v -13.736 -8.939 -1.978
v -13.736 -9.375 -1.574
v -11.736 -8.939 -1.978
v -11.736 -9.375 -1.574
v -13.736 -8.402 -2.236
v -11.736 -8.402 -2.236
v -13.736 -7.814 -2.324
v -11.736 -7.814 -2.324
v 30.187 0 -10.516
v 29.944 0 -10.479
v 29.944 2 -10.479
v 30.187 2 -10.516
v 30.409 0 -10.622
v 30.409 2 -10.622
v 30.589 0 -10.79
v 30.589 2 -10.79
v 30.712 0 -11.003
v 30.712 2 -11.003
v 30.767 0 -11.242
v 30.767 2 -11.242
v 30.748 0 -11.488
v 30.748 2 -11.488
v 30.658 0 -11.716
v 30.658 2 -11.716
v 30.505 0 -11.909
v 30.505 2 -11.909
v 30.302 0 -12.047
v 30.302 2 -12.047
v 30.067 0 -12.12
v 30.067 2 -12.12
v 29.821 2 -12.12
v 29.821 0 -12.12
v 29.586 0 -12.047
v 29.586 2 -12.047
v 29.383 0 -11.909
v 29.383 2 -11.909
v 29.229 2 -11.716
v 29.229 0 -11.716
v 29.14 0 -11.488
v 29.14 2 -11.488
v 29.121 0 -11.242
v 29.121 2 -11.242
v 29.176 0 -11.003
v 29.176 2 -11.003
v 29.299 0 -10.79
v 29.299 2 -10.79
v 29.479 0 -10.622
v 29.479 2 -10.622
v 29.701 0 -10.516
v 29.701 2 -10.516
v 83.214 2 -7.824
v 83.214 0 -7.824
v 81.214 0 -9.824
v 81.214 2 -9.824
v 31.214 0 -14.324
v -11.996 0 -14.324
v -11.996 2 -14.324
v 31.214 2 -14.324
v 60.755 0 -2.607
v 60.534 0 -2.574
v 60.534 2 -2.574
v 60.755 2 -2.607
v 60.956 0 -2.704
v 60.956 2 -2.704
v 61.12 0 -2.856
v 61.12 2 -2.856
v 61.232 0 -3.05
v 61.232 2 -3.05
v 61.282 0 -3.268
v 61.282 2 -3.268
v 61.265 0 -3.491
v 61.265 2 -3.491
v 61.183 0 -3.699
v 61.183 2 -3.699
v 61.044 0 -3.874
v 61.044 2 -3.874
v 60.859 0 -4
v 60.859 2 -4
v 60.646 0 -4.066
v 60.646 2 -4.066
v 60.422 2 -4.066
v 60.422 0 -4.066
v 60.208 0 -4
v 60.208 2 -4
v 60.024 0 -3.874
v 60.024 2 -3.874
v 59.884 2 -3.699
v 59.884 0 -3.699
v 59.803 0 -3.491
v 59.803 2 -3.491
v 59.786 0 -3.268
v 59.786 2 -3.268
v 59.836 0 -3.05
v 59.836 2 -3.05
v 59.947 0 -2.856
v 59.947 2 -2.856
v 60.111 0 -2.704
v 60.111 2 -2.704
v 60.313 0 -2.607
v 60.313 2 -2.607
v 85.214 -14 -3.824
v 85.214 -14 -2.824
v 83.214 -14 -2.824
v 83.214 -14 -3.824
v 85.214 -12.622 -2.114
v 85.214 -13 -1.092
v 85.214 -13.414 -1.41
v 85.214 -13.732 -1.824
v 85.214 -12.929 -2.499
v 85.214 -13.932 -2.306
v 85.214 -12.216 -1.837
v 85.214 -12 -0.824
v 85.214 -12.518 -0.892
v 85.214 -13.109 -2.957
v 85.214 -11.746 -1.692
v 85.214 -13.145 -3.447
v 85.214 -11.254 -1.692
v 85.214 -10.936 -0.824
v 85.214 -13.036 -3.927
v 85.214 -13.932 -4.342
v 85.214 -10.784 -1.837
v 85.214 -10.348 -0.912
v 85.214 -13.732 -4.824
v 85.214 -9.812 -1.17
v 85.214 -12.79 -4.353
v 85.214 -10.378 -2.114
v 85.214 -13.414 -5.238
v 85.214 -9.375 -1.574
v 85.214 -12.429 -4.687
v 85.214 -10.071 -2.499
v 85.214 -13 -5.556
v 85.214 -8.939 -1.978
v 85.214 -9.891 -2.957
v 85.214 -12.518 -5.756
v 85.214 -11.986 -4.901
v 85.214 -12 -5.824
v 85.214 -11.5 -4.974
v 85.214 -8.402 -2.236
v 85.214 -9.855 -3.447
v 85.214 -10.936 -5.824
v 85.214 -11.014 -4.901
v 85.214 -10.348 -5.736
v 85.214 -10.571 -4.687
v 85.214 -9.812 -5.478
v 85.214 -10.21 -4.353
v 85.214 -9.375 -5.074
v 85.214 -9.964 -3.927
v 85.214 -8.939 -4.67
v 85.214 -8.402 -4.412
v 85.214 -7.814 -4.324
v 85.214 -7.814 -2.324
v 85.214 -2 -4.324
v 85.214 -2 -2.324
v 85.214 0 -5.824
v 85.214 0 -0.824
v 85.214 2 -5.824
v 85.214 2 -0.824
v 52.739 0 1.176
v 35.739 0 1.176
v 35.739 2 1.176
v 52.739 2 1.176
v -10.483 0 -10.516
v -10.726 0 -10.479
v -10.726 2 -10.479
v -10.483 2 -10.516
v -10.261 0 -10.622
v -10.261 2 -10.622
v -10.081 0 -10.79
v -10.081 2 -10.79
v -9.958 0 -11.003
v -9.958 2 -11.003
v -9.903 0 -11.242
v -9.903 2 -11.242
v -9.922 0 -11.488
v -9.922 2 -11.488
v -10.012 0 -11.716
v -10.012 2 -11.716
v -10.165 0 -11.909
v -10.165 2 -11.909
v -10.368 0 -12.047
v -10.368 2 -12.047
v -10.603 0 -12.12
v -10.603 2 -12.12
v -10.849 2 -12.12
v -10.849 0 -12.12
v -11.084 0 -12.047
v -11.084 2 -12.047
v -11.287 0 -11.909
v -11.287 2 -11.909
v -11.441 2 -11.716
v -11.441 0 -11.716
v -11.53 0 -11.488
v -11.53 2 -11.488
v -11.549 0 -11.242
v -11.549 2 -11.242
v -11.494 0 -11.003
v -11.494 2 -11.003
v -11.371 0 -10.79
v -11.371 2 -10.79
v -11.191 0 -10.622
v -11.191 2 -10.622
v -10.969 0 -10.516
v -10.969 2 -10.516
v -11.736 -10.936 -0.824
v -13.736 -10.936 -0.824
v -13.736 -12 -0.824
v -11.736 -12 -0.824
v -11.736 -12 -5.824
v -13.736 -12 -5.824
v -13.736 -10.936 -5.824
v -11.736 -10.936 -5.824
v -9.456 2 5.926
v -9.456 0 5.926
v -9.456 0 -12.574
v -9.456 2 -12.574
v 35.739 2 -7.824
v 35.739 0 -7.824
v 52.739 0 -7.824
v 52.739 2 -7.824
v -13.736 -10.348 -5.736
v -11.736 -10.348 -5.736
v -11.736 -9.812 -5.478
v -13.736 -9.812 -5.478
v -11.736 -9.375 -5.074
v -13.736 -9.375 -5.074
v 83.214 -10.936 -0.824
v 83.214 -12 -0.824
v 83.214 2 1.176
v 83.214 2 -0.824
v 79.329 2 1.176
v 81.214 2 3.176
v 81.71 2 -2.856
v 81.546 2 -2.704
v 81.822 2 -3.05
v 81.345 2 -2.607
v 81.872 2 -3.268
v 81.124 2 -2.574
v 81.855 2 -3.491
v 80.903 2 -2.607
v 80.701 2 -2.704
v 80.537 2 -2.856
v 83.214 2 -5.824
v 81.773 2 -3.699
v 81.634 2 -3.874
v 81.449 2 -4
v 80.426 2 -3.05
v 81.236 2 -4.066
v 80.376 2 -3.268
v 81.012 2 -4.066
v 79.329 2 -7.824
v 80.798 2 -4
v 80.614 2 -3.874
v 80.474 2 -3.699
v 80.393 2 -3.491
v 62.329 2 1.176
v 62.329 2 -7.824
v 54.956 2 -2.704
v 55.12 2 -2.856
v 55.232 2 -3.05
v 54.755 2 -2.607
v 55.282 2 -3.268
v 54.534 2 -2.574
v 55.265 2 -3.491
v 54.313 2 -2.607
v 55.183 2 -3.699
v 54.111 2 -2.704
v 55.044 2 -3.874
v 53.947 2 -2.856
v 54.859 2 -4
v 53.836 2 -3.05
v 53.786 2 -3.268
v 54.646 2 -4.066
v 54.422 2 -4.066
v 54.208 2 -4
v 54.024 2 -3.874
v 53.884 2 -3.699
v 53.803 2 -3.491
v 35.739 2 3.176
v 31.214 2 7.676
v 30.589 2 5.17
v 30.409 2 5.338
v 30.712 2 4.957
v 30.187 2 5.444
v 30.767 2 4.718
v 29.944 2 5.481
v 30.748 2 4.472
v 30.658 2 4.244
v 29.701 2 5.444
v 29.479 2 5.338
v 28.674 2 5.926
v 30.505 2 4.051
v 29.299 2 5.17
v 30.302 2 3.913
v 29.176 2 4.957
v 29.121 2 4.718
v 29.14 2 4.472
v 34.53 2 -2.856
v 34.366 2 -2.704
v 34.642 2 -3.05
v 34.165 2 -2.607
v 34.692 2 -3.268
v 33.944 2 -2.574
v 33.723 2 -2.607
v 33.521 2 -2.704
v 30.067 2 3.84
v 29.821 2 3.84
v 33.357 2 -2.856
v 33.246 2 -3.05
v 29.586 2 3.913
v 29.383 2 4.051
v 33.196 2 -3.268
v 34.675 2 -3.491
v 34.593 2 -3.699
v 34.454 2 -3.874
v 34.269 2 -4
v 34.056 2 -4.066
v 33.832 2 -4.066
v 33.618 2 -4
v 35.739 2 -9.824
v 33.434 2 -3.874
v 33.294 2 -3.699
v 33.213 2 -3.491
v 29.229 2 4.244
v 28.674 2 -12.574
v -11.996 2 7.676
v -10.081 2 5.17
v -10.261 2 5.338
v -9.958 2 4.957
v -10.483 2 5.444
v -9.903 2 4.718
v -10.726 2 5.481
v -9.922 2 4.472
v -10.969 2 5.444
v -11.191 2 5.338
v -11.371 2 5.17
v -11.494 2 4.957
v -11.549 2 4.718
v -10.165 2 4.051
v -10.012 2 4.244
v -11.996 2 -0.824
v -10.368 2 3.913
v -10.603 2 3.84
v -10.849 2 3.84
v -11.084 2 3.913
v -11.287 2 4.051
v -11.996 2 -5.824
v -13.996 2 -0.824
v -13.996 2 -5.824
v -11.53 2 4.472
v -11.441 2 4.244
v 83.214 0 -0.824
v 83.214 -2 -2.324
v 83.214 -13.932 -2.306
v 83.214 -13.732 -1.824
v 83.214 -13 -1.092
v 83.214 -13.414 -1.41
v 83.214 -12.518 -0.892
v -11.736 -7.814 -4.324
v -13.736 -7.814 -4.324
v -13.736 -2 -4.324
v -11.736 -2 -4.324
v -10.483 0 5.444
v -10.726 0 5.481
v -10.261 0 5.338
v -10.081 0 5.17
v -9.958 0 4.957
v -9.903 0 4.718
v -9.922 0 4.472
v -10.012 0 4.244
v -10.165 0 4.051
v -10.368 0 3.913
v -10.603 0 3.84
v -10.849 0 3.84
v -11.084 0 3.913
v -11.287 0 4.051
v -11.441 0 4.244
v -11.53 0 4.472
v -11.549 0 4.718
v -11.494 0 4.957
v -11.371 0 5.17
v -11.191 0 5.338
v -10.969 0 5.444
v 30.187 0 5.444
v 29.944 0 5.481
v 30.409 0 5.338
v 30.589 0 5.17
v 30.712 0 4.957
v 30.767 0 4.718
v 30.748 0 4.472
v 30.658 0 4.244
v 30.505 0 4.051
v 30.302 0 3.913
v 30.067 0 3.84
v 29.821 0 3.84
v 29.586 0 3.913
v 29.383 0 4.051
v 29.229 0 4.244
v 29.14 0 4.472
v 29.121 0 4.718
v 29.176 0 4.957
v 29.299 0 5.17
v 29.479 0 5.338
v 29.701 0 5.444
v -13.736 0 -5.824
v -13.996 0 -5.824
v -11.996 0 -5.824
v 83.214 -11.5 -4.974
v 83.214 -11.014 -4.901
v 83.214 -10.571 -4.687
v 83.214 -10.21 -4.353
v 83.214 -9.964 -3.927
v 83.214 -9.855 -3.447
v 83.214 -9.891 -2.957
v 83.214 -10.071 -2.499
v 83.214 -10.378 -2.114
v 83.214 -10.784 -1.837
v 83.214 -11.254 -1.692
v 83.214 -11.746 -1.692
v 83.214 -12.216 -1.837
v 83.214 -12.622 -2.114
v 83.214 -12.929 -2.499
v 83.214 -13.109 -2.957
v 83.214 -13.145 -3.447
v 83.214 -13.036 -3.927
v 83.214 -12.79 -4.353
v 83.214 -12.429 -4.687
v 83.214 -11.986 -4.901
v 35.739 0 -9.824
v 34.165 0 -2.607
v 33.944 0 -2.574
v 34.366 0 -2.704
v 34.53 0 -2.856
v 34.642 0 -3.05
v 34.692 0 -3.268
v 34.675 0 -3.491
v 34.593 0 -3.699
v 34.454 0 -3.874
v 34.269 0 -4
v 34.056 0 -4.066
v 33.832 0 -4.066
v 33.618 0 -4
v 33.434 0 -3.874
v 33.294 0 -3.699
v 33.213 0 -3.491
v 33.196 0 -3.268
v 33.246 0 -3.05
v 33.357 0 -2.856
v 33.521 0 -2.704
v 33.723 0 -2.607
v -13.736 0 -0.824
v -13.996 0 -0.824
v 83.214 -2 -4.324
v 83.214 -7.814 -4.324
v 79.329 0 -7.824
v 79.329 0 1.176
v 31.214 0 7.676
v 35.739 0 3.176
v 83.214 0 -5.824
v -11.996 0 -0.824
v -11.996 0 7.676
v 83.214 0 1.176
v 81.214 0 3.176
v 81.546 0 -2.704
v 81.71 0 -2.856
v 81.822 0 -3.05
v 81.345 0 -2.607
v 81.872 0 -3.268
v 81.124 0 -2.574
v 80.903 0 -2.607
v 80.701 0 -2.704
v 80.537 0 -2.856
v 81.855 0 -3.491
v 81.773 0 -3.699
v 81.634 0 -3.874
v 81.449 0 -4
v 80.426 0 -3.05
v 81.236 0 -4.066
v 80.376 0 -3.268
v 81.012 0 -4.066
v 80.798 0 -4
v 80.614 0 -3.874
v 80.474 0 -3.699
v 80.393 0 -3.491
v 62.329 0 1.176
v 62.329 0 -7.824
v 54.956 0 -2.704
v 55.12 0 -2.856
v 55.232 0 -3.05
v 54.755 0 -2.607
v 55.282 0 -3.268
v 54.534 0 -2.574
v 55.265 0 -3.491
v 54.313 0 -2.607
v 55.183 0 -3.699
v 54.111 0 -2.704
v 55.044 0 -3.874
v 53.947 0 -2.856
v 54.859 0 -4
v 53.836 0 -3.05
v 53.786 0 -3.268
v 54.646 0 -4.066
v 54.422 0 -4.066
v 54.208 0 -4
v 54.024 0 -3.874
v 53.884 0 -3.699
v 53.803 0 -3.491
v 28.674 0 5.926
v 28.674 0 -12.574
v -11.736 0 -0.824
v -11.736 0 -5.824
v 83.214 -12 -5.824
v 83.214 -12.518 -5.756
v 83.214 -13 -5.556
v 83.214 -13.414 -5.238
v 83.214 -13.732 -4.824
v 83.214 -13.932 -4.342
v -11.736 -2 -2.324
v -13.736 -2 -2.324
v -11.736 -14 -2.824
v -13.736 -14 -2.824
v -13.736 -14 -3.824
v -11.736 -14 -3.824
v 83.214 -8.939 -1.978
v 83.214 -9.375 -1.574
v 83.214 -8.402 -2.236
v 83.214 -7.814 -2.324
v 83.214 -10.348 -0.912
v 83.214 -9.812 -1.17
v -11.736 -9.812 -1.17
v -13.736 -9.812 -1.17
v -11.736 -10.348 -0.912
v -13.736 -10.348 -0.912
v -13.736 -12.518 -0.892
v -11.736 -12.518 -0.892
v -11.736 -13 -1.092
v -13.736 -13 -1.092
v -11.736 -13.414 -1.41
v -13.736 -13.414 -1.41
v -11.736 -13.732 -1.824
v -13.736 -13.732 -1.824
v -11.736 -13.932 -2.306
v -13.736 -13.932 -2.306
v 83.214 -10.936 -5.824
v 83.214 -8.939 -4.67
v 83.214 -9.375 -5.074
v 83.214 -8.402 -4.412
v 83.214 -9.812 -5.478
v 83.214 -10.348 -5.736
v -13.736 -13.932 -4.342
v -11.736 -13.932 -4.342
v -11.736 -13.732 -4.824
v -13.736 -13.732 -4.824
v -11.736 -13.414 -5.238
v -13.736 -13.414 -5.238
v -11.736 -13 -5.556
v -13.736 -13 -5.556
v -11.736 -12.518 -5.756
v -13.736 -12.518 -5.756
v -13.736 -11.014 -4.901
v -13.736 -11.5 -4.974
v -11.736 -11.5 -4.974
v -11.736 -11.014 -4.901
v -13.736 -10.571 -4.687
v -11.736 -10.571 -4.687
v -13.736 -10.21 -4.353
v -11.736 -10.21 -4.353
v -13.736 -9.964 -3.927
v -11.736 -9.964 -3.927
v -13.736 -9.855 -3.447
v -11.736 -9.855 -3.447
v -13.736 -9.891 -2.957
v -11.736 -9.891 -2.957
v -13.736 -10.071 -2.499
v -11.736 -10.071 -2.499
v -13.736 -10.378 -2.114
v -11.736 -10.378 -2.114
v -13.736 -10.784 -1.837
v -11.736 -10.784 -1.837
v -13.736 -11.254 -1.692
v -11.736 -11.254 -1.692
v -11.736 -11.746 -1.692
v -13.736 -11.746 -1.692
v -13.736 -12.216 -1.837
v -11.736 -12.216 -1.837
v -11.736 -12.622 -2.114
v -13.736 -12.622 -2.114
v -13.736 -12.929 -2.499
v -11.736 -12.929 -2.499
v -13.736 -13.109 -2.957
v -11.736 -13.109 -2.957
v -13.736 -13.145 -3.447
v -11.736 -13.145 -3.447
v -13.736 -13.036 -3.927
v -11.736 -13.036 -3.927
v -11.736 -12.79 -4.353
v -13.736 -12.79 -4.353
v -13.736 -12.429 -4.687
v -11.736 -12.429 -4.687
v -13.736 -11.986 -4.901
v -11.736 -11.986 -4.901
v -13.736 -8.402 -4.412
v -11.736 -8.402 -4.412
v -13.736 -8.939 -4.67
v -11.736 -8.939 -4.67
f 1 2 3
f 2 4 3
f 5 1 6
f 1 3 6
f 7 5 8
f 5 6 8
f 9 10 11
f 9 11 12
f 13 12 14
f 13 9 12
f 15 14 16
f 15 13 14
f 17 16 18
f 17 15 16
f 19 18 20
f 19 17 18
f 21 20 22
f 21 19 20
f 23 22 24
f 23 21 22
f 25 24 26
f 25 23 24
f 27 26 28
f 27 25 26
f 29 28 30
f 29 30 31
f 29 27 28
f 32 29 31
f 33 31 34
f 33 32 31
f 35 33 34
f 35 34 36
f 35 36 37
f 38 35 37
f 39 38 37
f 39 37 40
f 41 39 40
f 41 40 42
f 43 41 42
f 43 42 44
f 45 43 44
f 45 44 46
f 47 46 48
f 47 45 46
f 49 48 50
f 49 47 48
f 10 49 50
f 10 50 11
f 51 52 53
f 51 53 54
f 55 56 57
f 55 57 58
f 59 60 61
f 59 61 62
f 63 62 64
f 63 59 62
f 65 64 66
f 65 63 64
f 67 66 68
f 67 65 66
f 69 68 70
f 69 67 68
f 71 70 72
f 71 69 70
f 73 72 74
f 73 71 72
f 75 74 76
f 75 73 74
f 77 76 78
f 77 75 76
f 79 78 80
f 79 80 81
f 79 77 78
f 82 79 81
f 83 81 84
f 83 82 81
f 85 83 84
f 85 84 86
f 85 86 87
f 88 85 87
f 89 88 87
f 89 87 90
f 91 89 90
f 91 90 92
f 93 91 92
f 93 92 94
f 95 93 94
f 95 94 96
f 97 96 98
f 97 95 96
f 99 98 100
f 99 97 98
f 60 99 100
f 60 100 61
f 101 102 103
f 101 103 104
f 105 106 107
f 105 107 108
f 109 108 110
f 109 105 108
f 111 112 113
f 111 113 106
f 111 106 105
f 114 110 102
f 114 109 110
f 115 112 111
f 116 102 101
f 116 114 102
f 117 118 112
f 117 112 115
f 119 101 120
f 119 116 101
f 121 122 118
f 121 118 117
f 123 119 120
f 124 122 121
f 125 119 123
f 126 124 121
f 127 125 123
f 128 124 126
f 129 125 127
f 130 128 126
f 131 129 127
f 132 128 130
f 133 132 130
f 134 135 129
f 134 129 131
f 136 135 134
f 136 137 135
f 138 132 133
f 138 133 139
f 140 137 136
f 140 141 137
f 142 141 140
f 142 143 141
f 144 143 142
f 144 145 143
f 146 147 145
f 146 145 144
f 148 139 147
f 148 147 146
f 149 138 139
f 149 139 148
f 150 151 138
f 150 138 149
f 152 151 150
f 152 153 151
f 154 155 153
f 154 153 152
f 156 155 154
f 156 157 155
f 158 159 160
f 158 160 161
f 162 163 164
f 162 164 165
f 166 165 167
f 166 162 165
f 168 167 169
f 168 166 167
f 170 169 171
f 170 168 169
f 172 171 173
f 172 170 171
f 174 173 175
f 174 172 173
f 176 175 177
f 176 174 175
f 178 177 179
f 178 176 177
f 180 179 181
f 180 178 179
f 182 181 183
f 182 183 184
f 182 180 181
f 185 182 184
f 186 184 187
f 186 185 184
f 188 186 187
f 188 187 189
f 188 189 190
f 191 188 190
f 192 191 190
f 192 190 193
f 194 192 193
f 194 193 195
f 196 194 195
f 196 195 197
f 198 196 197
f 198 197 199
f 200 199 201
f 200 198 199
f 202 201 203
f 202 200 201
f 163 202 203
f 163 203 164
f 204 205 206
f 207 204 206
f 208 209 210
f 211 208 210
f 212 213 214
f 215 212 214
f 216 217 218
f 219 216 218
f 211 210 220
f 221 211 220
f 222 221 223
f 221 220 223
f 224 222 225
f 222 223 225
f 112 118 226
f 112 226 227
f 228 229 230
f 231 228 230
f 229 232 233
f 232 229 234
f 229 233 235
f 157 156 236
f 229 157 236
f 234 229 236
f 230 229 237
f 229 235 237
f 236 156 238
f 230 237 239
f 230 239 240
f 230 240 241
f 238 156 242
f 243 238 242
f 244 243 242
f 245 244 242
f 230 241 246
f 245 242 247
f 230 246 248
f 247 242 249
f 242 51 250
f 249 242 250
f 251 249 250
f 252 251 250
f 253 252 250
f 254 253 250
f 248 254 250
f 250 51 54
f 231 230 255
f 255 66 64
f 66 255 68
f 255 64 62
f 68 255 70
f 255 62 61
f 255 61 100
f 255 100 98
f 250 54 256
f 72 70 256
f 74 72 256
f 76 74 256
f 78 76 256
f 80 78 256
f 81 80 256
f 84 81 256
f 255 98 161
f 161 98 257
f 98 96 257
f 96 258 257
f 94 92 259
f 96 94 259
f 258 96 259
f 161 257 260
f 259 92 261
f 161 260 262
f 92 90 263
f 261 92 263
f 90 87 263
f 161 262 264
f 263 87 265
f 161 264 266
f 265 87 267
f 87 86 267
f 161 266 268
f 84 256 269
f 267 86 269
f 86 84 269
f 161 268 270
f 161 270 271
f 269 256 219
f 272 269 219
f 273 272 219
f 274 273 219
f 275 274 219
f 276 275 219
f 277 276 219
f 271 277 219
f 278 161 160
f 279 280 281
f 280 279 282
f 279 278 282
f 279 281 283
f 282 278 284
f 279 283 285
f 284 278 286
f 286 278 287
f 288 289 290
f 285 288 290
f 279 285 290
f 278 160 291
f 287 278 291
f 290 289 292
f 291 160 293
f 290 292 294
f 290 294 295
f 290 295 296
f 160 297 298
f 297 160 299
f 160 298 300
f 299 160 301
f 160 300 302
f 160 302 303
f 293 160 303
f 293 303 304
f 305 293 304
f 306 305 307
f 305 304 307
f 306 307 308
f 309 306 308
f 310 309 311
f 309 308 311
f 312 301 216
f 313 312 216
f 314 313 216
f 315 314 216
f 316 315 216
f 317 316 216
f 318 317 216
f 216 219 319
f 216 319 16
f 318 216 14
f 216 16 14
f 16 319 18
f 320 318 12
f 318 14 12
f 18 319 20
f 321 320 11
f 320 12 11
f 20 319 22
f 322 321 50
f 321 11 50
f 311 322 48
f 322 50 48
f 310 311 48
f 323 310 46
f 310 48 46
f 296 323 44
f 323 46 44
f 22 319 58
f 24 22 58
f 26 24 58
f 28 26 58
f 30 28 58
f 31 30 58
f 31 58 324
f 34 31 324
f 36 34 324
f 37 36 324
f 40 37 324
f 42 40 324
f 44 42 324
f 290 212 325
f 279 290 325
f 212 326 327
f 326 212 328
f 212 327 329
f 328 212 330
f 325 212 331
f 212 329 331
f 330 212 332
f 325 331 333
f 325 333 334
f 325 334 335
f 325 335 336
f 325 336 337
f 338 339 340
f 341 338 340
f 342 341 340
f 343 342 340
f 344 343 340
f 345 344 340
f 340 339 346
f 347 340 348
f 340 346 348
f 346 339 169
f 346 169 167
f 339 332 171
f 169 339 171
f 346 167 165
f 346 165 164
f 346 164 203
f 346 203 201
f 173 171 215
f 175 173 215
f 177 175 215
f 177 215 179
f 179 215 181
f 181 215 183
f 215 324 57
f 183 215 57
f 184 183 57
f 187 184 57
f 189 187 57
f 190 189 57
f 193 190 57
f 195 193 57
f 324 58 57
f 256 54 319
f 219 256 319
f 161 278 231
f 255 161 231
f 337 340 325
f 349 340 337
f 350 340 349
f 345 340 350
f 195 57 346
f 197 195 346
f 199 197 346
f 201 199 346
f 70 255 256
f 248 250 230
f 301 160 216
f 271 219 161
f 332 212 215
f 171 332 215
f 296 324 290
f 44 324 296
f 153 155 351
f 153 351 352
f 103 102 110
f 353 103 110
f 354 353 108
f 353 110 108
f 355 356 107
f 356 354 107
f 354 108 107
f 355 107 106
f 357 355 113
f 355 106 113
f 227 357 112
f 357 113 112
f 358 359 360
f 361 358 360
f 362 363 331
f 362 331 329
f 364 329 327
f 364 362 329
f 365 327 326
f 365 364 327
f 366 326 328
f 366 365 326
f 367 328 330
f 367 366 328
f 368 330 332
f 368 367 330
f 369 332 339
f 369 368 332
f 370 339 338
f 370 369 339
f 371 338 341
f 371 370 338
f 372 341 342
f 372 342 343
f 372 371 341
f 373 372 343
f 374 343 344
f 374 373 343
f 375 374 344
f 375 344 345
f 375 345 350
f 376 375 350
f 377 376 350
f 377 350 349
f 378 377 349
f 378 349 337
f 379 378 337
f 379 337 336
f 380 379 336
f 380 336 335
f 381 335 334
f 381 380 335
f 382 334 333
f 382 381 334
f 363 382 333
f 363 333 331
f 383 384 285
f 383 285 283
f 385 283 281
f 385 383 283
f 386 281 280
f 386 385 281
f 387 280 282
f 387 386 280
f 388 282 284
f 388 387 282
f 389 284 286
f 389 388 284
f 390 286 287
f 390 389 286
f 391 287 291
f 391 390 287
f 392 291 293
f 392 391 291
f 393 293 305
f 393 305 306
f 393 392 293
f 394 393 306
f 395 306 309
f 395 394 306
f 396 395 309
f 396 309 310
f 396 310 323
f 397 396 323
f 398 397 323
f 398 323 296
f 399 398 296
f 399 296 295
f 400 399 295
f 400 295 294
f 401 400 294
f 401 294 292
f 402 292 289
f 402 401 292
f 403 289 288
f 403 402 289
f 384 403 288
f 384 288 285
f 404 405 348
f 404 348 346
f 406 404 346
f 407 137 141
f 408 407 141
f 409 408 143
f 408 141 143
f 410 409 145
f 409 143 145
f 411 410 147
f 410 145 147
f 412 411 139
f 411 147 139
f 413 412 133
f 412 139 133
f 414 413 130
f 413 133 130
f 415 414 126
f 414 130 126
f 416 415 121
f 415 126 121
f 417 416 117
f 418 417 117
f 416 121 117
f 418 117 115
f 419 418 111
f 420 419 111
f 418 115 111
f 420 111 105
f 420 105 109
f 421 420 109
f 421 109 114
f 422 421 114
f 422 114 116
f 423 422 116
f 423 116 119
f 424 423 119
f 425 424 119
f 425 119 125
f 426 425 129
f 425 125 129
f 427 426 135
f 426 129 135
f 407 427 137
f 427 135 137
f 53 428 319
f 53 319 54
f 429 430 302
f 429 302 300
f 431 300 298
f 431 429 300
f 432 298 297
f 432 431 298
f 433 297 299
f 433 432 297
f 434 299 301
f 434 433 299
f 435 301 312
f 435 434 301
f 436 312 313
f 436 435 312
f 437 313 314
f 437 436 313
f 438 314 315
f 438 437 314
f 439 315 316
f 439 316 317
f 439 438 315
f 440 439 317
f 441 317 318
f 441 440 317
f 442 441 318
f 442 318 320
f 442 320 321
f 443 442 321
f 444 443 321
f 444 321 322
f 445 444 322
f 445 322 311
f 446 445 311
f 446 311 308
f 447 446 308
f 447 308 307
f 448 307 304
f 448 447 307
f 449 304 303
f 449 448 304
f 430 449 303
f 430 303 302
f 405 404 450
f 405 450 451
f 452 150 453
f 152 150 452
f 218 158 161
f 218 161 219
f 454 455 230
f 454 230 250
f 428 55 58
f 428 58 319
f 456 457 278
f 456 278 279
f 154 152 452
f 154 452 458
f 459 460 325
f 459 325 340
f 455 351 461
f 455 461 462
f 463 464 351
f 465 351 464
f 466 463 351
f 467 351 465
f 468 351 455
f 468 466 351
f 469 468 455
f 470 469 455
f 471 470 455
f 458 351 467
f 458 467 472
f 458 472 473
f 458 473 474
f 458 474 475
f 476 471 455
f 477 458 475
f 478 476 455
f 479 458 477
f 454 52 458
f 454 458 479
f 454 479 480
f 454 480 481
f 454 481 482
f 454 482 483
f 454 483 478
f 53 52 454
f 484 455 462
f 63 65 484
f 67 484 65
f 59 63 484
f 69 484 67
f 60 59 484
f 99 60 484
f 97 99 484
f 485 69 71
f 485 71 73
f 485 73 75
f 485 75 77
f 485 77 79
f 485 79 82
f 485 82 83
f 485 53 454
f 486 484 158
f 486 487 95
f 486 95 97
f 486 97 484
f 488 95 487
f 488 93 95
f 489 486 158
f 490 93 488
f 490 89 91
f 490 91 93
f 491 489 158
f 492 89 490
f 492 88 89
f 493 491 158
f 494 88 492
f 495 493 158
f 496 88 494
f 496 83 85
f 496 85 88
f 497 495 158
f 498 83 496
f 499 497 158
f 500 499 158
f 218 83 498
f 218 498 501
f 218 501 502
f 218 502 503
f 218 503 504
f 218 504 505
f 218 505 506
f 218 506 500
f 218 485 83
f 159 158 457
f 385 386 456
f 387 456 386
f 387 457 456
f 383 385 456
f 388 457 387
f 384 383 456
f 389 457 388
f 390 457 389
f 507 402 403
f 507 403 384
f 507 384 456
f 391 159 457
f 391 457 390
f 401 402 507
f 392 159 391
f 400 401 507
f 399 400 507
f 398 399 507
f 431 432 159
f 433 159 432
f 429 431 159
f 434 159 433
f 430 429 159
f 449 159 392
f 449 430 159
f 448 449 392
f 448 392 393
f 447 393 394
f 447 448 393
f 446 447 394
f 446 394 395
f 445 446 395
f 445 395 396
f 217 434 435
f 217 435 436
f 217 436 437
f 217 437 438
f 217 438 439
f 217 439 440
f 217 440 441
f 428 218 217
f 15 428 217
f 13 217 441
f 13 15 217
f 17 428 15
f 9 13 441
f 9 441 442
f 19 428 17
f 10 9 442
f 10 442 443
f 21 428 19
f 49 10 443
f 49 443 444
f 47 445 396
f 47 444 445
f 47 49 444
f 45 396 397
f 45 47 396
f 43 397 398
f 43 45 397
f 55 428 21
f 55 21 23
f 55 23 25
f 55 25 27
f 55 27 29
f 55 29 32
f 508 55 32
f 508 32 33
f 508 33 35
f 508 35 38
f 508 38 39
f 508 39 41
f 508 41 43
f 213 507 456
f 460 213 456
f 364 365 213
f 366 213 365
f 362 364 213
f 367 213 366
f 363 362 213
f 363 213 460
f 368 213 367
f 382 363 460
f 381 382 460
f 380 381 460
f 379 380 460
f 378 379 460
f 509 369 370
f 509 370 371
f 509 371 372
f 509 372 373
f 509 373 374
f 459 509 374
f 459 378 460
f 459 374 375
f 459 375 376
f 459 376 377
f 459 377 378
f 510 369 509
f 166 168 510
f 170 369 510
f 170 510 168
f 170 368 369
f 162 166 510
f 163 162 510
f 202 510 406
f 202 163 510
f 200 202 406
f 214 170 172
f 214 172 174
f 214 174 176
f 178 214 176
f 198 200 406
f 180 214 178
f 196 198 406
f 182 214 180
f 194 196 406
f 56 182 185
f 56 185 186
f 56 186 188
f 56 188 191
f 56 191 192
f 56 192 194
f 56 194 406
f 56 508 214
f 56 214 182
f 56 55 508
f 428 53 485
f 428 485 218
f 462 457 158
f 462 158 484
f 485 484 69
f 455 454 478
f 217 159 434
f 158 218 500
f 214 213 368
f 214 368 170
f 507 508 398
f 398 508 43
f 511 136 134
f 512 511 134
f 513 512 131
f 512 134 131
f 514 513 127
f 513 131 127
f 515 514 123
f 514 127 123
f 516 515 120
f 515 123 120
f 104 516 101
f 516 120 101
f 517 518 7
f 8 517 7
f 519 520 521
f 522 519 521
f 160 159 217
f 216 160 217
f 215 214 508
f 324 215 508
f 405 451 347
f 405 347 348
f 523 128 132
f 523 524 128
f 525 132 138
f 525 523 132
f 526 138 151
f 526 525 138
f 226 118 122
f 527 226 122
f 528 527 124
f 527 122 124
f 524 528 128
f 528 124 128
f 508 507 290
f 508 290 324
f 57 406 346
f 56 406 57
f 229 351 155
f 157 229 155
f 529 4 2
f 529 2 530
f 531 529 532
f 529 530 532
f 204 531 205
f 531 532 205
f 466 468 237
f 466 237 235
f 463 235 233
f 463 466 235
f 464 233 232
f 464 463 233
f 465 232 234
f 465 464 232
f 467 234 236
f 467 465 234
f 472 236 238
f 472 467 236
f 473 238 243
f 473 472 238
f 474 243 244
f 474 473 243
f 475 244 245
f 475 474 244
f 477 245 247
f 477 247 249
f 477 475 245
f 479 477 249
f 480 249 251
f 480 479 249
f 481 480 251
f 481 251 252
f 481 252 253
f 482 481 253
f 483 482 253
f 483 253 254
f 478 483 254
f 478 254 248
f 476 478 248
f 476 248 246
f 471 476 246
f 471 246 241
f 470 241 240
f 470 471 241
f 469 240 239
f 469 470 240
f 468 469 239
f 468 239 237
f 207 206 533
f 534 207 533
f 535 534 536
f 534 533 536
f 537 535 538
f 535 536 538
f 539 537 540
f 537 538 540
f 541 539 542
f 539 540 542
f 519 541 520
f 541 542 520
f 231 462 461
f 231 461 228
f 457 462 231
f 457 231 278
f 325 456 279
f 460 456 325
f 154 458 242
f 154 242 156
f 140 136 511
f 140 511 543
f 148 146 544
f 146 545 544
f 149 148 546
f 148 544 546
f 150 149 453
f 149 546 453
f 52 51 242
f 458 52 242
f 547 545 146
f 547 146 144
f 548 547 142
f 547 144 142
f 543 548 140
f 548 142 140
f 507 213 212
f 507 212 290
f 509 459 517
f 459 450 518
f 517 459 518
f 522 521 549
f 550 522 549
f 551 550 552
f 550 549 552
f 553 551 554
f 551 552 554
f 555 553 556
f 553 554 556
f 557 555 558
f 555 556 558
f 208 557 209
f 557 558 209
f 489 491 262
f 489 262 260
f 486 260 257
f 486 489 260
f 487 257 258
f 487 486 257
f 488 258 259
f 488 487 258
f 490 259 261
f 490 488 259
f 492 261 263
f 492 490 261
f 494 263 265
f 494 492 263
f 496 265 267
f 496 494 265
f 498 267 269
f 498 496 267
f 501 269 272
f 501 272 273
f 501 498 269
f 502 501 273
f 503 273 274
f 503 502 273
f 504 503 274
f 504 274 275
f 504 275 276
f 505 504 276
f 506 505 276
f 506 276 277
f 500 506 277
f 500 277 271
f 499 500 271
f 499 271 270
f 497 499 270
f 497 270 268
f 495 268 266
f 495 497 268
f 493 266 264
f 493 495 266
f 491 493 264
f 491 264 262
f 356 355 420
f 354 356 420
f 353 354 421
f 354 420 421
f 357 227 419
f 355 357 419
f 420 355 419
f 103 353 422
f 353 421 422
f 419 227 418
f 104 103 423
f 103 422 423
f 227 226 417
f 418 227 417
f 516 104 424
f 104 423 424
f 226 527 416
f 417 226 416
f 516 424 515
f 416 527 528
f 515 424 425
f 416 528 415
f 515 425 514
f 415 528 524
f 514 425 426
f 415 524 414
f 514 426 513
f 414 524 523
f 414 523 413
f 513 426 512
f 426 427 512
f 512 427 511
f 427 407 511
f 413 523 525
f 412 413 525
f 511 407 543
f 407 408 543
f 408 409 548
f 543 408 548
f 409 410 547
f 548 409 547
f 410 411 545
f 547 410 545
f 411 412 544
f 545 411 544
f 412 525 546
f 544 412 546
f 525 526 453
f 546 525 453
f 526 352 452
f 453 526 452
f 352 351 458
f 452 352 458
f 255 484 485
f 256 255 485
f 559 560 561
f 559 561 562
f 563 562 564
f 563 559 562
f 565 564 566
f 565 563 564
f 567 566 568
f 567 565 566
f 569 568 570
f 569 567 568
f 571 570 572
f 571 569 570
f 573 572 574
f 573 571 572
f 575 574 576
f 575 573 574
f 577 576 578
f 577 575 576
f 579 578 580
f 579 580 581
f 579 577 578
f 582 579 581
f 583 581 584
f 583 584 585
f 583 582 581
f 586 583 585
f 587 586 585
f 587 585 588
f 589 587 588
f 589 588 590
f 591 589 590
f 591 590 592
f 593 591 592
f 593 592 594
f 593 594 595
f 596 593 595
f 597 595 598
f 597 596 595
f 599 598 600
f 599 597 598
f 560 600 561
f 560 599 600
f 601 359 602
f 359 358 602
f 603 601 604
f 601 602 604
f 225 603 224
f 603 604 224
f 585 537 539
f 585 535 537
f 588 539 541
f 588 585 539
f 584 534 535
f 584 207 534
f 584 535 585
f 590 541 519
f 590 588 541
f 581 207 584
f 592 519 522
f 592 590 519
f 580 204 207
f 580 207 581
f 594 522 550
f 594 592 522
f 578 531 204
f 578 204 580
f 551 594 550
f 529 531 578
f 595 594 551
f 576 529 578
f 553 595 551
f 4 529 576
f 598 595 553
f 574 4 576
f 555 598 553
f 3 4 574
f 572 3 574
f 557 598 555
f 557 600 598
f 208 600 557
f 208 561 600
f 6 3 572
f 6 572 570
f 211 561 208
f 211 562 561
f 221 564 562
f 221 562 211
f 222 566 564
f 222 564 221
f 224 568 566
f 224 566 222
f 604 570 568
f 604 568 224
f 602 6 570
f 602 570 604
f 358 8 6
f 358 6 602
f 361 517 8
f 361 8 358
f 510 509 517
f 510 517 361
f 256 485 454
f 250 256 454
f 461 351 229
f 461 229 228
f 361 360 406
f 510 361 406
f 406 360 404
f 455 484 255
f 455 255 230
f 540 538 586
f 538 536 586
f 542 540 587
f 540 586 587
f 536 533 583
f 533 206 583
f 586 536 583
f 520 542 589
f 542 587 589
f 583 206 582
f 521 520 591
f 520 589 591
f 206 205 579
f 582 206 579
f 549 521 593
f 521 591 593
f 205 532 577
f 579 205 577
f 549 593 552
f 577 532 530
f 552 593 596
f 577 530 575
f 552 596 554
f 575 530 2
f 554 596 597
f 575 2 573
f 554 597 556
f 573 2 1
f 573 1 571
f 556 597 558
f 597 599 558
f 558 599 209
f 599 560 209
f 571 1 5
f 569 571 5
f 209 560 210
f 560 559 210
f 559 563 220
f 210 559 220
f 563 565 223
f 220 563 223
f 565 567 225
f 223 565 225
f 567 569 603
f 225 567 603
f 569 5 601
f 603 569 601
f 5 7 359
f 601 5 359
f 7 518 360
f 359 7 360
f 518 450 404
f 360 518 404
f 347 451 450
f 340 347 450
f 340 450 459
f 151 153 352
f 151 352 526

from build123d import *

# Parameters (mm, degrees)
ESQUISSE1_R        = 0.825
ESQUISSE1_R_2      = 0.75
ESQUISSE1_W        = 38.13
ESQUISSE1_H        = 18.5
ESQUISSE1_W_2      = 17
ESQUISSE1_H_2      = 9
ESQUISSE1_W_3      = 2
ESQUISSE1_H_3      = 5
BOSS_EXTRU_1_DEPTH = 2
CHANFREIN1_SIZE    = 2
ESQUISSE2_R        = 1.65
BOSS_EXTRU_2_DEPTH = 2
CONG_1_R           = 2
CONG_4_R           = 2


with BuildPart() as part:
    # Esquisse1 → Boss.-Extru.1 (new body)
    # profile 1 of 3: a face of its own
    with BuildSketch(Plane(origin=(0, 0, 0), x_dir=(1, 0, 0), z_dir=(0, 1, 0))):
        Polygon((-11.996169772, 14.323981369), (31.213830228, 14.323981369), (35.738830228, 9.823981369), (83.213830228, 9.823981369), (83.213830228, -3.176018631), (35.738830228, -3.176018631), (31.213830228, -7.676018631), (-11.996169772, -7.676018631), align=None)
        with Locations(Location((-10.726169772, 11.303981369, 0), (0, 0, 270))):
            Circle(ESQUISSE1_R, mode=Mode.SUBTRACT)
        with Locations(Location((29.943830228, 11.303981369, 0), (0, 0, 270))):
            Circle(ESQUISSE1_R, mode=Mode.SUBTRACT)
        with Locations(Location((29.943830228, -4.656018631, 0), (0, 0, 270))):
            Circle(ESQUISSE1_R, mode=Mode.SUBTRACT)
        with Locations(Location((-10.726169772, -4.656018631, 0), (0, 0, 270))):
            Circle(ESQUISSE1_R, mode=Mode.SUBTRACT)
        with Locations(Location((33.943830228, 3.323981369, 0), (0, 0, 270))):
            Circle(ESQUISSE1_R_2, mode=Mode.SUBTRACT)
        with Locations(Location((54.533830228, 3.323981369, 0), (0, 0, 270))):
            Circle(ESQUISSE1_R_2, mode=Mode.SUBTRACT)
        with Locations(Location((60.533830228, 3.323981369, 0), (0, 0, 270))):
            Circle(ESQUISSE1_R_2, mode=Mode.SUBTRACT)
        with Locations(Location((81.123830228, 3.323981369, 0), (0, 0, 270))):
            Circle(ESQUISSE1_R_2, mode=Mode.SUBTRACT)
        with Locations((9.608830228, 3.323981369)):
            Rectangle(ESQUISSE1_W, ESQUISSE1_H, mode=Mode.SUBTRACT)
        with Locations((44.238830228, 3.323981369)):
            Rectangle(ESQUISSE1_W_2, ESQUISSE1_H_2, mode=Mode.SUBTRACT)
        with Locations((70.828830228, 3.323981369)):
            Rectangle(ESQUISSE1_W_2, ESQUISSE1_H_2, mode=Mode.SUBTRACT)
    # profile 2 of 3: a face of its own
    with BuildSketch(Plane(origin=(0, 0, 0), x_dir=(1, 0, 0), z_dir=(0, 1, 0))):
        with Locations((-12.996169772, 3.323981369)):
            Rectangle(ESQUISSE1_W_3, ESQUISSE1_H_3)
    # profile 3 of 3: a face of its own
    with BuildSketch(Plane(origin=(0, 0, 0), x_dir=(1, 0, 0), z_dir=(0, 1, 0))):
        with Locations((84.213830228, 3.323981369)):
            Rectangle(ESQUISSE1_W_3, ESQUISSE1_H_3)
    extrude(amount=BOSS_EXTRU_1_DEPTH)

    # Chanfrein1
    chanfrein1_edges = [part.edges().sort_by_distance(p)[0] for p in [
        (83.213830228, 1, -9.823981369),
        (83.213830228, 1, 3.176018631),
    ]]
    chamfer(chanfrein1_edges, length=CHANFREIN1_SIZE)

    # Esquisse2 → Boss.-Extru.2 (add)
    with BuildSketch(Plane(origin=(85.213830228, 0, 0), x_dir=(0, 0, -1), z_dir=(1, 0, 0))):
        Polygon((5.823981369, 0), (0.823981369, 0), (2.323981369, -2), (2.323981369, -9), (0.823981369, -9), (0.823981369, -14), (5.823981369, -14), (5.823981369, -9), (4.323981369, -9), (4.323981369, -2), align=None)
        with Locations((3.323981369, -11.5)):
            Circle(ESQUISSE2_R, mode=Mode.SUBTRACT)
    boss_extru_2 = extrude(amount=-BOSS_EXTRU_2_DEPTH)

    # Symétrie1: Boss.-Extru.2 across plane
    add(boss_extru_2.mirror(Plane(origin=(35.738830228, 2, 0), x_dir=(0, 0, 1), z_dir=(-1, 0, 0))))

    # Congé1
    # the kernel refuses this fillet: 2 mm, written as the material it takes off along each edge
    with BuildSketch(Plane(origin=(90.213830228, -14, -5.823981369), x_dir=(0, 0, 1), z_dir=(-1, 0, 0)), Plane(origin=(90.213830228, -14, -0.823981369), x_dir=(0, 1, 0), z_dir=(-1, 0, 0))) as cong_1_piece_1:
        with BuildLine():
            CenterArc((CONG_1_R, CONG_1_R), CONG_1_R, 180, 90)
            Line((0, CONG_1_R), (-CONG_1_R * 0.02, CONG_1_R))
            Line((-CONG_1_R * 0.02, CONG_1_R), (-CONG_1_R * 0.02, -CONG_1_R * 0.02))
            Line((-CONG_1_R * 0.02, -CONG_1_R * 0.02), (CONG_1_R, -CONG_1_R * 0.02))
            Line((CONG_1_R, -CONG_1_R * 0.02), (CONG_1_R, 0))
        make_face()
    extrude(amount=12, mode=Mode.SUBTRACT)
    with BuildSketch(Plane(origin=(90.055059411, -9, -5.823981369), x_dir=(0, -1, 0), z_dir=(-1, 0, 0)), Plane(origin=(-18.577398955, -9, -0.823981369), x_dir=(0, -1, 0), z_dir=(1, 0, 0))) as cong_1_piece_2:
        with BuildLine():
            CenterArc((1.936491673, 2), CONG_1_R, 194.477512186, 75.522487814)
            Line((0, 1.5), (-0.038729833, 1.49))
            ThreePointArc((-0.038729833, 1.49), (-0.04, 0.75), (-0.04, 0))
            Line((-0.04, 0), (0, -0.04))
            Line((0, -0.04), (1.936491673, -0.04))
            Line((1.936491673, -0.04), (1.936491673, 0))
        make_face()
    extrude(amount=11.682458366, mode=Mode.SUBTRACT)
    with BuildSketch(Plane(origin=(90.055059411, -9, -0.823981369), x_dir=(0, -1, 0), z_dir=(-1, 0, 0)), Plane(origin=(-18.577398955, -9, -5.823981369), x_dir=(0, -1, 0), z_dir=(1, 0, 0))) as cong_1_piece_3:
        with BuildLine():
            CenterArc((1.936491673, -2), CONG_1_R, 90, 75.522487814)
            Line((0, -1.5), (-0.038729833, -1.49))
            ThreePointArc((-0.038729833, -1.49), (-0.04, -0.75), (-0.04, 0))
            Line((-0.04, 0), (0, 0.04))
            Line((0, 0.04), (1.936491673, 0.04))
            Line((1.936491673, 0.04), (1.936491673, 0))
        make_face()
    extrude(amount=11.682458366, mode=Mode.SUBTRACT)
    with BuildSketch(Plane(origin=(-18.736169772, -14, -5.823981369), x_dir=(0, 0, 1), z_dir=(1, 0, 0)), Plane(origin=(-18.736169772, -14, -0.823981369), x_dir=(0, 1, 0), z_dir=(1, 0, 0))) as cong_1_piece_4:
        with BuildLine():
            CenterArc((CONG_1_R, -CONG_1_R), CONG_1_R, 90, 90)
            Line((0, -CONG_1_R), (-CONG_1_R * 0.02, -CONG_1_R))
            Line((-CONG_1_R * 0.02, -CONG_1_R), (-CONG_1_R * 0.02, CONG_1_R * 0.02))
            Line((-CONG_1_R * 0.02, CONG_1_R * 0.02), (CONG_1_R, CONG_1_R * 0.02))
            Line((CONG_1_R, CONG_1_R * 0.02), (CONG_1_R, 0))
        make_face()
    extrude(amount=12, mode=Mode.SUBTRACT)

    # Congé4
    cong_4_edges = [part.edges().sort_by_distance(p)[0] for p in [
        (84.213830228, -9, -4.323981369),
        (84.213830228, -9, -2.323981369),
        (-12.736169772, -9, -4.323981369),
        (-12.736169772, -9, -2.323981369),
    ]]
    fillet(cong_4_edges, radius=CONG_4_R)


solid = part.part
